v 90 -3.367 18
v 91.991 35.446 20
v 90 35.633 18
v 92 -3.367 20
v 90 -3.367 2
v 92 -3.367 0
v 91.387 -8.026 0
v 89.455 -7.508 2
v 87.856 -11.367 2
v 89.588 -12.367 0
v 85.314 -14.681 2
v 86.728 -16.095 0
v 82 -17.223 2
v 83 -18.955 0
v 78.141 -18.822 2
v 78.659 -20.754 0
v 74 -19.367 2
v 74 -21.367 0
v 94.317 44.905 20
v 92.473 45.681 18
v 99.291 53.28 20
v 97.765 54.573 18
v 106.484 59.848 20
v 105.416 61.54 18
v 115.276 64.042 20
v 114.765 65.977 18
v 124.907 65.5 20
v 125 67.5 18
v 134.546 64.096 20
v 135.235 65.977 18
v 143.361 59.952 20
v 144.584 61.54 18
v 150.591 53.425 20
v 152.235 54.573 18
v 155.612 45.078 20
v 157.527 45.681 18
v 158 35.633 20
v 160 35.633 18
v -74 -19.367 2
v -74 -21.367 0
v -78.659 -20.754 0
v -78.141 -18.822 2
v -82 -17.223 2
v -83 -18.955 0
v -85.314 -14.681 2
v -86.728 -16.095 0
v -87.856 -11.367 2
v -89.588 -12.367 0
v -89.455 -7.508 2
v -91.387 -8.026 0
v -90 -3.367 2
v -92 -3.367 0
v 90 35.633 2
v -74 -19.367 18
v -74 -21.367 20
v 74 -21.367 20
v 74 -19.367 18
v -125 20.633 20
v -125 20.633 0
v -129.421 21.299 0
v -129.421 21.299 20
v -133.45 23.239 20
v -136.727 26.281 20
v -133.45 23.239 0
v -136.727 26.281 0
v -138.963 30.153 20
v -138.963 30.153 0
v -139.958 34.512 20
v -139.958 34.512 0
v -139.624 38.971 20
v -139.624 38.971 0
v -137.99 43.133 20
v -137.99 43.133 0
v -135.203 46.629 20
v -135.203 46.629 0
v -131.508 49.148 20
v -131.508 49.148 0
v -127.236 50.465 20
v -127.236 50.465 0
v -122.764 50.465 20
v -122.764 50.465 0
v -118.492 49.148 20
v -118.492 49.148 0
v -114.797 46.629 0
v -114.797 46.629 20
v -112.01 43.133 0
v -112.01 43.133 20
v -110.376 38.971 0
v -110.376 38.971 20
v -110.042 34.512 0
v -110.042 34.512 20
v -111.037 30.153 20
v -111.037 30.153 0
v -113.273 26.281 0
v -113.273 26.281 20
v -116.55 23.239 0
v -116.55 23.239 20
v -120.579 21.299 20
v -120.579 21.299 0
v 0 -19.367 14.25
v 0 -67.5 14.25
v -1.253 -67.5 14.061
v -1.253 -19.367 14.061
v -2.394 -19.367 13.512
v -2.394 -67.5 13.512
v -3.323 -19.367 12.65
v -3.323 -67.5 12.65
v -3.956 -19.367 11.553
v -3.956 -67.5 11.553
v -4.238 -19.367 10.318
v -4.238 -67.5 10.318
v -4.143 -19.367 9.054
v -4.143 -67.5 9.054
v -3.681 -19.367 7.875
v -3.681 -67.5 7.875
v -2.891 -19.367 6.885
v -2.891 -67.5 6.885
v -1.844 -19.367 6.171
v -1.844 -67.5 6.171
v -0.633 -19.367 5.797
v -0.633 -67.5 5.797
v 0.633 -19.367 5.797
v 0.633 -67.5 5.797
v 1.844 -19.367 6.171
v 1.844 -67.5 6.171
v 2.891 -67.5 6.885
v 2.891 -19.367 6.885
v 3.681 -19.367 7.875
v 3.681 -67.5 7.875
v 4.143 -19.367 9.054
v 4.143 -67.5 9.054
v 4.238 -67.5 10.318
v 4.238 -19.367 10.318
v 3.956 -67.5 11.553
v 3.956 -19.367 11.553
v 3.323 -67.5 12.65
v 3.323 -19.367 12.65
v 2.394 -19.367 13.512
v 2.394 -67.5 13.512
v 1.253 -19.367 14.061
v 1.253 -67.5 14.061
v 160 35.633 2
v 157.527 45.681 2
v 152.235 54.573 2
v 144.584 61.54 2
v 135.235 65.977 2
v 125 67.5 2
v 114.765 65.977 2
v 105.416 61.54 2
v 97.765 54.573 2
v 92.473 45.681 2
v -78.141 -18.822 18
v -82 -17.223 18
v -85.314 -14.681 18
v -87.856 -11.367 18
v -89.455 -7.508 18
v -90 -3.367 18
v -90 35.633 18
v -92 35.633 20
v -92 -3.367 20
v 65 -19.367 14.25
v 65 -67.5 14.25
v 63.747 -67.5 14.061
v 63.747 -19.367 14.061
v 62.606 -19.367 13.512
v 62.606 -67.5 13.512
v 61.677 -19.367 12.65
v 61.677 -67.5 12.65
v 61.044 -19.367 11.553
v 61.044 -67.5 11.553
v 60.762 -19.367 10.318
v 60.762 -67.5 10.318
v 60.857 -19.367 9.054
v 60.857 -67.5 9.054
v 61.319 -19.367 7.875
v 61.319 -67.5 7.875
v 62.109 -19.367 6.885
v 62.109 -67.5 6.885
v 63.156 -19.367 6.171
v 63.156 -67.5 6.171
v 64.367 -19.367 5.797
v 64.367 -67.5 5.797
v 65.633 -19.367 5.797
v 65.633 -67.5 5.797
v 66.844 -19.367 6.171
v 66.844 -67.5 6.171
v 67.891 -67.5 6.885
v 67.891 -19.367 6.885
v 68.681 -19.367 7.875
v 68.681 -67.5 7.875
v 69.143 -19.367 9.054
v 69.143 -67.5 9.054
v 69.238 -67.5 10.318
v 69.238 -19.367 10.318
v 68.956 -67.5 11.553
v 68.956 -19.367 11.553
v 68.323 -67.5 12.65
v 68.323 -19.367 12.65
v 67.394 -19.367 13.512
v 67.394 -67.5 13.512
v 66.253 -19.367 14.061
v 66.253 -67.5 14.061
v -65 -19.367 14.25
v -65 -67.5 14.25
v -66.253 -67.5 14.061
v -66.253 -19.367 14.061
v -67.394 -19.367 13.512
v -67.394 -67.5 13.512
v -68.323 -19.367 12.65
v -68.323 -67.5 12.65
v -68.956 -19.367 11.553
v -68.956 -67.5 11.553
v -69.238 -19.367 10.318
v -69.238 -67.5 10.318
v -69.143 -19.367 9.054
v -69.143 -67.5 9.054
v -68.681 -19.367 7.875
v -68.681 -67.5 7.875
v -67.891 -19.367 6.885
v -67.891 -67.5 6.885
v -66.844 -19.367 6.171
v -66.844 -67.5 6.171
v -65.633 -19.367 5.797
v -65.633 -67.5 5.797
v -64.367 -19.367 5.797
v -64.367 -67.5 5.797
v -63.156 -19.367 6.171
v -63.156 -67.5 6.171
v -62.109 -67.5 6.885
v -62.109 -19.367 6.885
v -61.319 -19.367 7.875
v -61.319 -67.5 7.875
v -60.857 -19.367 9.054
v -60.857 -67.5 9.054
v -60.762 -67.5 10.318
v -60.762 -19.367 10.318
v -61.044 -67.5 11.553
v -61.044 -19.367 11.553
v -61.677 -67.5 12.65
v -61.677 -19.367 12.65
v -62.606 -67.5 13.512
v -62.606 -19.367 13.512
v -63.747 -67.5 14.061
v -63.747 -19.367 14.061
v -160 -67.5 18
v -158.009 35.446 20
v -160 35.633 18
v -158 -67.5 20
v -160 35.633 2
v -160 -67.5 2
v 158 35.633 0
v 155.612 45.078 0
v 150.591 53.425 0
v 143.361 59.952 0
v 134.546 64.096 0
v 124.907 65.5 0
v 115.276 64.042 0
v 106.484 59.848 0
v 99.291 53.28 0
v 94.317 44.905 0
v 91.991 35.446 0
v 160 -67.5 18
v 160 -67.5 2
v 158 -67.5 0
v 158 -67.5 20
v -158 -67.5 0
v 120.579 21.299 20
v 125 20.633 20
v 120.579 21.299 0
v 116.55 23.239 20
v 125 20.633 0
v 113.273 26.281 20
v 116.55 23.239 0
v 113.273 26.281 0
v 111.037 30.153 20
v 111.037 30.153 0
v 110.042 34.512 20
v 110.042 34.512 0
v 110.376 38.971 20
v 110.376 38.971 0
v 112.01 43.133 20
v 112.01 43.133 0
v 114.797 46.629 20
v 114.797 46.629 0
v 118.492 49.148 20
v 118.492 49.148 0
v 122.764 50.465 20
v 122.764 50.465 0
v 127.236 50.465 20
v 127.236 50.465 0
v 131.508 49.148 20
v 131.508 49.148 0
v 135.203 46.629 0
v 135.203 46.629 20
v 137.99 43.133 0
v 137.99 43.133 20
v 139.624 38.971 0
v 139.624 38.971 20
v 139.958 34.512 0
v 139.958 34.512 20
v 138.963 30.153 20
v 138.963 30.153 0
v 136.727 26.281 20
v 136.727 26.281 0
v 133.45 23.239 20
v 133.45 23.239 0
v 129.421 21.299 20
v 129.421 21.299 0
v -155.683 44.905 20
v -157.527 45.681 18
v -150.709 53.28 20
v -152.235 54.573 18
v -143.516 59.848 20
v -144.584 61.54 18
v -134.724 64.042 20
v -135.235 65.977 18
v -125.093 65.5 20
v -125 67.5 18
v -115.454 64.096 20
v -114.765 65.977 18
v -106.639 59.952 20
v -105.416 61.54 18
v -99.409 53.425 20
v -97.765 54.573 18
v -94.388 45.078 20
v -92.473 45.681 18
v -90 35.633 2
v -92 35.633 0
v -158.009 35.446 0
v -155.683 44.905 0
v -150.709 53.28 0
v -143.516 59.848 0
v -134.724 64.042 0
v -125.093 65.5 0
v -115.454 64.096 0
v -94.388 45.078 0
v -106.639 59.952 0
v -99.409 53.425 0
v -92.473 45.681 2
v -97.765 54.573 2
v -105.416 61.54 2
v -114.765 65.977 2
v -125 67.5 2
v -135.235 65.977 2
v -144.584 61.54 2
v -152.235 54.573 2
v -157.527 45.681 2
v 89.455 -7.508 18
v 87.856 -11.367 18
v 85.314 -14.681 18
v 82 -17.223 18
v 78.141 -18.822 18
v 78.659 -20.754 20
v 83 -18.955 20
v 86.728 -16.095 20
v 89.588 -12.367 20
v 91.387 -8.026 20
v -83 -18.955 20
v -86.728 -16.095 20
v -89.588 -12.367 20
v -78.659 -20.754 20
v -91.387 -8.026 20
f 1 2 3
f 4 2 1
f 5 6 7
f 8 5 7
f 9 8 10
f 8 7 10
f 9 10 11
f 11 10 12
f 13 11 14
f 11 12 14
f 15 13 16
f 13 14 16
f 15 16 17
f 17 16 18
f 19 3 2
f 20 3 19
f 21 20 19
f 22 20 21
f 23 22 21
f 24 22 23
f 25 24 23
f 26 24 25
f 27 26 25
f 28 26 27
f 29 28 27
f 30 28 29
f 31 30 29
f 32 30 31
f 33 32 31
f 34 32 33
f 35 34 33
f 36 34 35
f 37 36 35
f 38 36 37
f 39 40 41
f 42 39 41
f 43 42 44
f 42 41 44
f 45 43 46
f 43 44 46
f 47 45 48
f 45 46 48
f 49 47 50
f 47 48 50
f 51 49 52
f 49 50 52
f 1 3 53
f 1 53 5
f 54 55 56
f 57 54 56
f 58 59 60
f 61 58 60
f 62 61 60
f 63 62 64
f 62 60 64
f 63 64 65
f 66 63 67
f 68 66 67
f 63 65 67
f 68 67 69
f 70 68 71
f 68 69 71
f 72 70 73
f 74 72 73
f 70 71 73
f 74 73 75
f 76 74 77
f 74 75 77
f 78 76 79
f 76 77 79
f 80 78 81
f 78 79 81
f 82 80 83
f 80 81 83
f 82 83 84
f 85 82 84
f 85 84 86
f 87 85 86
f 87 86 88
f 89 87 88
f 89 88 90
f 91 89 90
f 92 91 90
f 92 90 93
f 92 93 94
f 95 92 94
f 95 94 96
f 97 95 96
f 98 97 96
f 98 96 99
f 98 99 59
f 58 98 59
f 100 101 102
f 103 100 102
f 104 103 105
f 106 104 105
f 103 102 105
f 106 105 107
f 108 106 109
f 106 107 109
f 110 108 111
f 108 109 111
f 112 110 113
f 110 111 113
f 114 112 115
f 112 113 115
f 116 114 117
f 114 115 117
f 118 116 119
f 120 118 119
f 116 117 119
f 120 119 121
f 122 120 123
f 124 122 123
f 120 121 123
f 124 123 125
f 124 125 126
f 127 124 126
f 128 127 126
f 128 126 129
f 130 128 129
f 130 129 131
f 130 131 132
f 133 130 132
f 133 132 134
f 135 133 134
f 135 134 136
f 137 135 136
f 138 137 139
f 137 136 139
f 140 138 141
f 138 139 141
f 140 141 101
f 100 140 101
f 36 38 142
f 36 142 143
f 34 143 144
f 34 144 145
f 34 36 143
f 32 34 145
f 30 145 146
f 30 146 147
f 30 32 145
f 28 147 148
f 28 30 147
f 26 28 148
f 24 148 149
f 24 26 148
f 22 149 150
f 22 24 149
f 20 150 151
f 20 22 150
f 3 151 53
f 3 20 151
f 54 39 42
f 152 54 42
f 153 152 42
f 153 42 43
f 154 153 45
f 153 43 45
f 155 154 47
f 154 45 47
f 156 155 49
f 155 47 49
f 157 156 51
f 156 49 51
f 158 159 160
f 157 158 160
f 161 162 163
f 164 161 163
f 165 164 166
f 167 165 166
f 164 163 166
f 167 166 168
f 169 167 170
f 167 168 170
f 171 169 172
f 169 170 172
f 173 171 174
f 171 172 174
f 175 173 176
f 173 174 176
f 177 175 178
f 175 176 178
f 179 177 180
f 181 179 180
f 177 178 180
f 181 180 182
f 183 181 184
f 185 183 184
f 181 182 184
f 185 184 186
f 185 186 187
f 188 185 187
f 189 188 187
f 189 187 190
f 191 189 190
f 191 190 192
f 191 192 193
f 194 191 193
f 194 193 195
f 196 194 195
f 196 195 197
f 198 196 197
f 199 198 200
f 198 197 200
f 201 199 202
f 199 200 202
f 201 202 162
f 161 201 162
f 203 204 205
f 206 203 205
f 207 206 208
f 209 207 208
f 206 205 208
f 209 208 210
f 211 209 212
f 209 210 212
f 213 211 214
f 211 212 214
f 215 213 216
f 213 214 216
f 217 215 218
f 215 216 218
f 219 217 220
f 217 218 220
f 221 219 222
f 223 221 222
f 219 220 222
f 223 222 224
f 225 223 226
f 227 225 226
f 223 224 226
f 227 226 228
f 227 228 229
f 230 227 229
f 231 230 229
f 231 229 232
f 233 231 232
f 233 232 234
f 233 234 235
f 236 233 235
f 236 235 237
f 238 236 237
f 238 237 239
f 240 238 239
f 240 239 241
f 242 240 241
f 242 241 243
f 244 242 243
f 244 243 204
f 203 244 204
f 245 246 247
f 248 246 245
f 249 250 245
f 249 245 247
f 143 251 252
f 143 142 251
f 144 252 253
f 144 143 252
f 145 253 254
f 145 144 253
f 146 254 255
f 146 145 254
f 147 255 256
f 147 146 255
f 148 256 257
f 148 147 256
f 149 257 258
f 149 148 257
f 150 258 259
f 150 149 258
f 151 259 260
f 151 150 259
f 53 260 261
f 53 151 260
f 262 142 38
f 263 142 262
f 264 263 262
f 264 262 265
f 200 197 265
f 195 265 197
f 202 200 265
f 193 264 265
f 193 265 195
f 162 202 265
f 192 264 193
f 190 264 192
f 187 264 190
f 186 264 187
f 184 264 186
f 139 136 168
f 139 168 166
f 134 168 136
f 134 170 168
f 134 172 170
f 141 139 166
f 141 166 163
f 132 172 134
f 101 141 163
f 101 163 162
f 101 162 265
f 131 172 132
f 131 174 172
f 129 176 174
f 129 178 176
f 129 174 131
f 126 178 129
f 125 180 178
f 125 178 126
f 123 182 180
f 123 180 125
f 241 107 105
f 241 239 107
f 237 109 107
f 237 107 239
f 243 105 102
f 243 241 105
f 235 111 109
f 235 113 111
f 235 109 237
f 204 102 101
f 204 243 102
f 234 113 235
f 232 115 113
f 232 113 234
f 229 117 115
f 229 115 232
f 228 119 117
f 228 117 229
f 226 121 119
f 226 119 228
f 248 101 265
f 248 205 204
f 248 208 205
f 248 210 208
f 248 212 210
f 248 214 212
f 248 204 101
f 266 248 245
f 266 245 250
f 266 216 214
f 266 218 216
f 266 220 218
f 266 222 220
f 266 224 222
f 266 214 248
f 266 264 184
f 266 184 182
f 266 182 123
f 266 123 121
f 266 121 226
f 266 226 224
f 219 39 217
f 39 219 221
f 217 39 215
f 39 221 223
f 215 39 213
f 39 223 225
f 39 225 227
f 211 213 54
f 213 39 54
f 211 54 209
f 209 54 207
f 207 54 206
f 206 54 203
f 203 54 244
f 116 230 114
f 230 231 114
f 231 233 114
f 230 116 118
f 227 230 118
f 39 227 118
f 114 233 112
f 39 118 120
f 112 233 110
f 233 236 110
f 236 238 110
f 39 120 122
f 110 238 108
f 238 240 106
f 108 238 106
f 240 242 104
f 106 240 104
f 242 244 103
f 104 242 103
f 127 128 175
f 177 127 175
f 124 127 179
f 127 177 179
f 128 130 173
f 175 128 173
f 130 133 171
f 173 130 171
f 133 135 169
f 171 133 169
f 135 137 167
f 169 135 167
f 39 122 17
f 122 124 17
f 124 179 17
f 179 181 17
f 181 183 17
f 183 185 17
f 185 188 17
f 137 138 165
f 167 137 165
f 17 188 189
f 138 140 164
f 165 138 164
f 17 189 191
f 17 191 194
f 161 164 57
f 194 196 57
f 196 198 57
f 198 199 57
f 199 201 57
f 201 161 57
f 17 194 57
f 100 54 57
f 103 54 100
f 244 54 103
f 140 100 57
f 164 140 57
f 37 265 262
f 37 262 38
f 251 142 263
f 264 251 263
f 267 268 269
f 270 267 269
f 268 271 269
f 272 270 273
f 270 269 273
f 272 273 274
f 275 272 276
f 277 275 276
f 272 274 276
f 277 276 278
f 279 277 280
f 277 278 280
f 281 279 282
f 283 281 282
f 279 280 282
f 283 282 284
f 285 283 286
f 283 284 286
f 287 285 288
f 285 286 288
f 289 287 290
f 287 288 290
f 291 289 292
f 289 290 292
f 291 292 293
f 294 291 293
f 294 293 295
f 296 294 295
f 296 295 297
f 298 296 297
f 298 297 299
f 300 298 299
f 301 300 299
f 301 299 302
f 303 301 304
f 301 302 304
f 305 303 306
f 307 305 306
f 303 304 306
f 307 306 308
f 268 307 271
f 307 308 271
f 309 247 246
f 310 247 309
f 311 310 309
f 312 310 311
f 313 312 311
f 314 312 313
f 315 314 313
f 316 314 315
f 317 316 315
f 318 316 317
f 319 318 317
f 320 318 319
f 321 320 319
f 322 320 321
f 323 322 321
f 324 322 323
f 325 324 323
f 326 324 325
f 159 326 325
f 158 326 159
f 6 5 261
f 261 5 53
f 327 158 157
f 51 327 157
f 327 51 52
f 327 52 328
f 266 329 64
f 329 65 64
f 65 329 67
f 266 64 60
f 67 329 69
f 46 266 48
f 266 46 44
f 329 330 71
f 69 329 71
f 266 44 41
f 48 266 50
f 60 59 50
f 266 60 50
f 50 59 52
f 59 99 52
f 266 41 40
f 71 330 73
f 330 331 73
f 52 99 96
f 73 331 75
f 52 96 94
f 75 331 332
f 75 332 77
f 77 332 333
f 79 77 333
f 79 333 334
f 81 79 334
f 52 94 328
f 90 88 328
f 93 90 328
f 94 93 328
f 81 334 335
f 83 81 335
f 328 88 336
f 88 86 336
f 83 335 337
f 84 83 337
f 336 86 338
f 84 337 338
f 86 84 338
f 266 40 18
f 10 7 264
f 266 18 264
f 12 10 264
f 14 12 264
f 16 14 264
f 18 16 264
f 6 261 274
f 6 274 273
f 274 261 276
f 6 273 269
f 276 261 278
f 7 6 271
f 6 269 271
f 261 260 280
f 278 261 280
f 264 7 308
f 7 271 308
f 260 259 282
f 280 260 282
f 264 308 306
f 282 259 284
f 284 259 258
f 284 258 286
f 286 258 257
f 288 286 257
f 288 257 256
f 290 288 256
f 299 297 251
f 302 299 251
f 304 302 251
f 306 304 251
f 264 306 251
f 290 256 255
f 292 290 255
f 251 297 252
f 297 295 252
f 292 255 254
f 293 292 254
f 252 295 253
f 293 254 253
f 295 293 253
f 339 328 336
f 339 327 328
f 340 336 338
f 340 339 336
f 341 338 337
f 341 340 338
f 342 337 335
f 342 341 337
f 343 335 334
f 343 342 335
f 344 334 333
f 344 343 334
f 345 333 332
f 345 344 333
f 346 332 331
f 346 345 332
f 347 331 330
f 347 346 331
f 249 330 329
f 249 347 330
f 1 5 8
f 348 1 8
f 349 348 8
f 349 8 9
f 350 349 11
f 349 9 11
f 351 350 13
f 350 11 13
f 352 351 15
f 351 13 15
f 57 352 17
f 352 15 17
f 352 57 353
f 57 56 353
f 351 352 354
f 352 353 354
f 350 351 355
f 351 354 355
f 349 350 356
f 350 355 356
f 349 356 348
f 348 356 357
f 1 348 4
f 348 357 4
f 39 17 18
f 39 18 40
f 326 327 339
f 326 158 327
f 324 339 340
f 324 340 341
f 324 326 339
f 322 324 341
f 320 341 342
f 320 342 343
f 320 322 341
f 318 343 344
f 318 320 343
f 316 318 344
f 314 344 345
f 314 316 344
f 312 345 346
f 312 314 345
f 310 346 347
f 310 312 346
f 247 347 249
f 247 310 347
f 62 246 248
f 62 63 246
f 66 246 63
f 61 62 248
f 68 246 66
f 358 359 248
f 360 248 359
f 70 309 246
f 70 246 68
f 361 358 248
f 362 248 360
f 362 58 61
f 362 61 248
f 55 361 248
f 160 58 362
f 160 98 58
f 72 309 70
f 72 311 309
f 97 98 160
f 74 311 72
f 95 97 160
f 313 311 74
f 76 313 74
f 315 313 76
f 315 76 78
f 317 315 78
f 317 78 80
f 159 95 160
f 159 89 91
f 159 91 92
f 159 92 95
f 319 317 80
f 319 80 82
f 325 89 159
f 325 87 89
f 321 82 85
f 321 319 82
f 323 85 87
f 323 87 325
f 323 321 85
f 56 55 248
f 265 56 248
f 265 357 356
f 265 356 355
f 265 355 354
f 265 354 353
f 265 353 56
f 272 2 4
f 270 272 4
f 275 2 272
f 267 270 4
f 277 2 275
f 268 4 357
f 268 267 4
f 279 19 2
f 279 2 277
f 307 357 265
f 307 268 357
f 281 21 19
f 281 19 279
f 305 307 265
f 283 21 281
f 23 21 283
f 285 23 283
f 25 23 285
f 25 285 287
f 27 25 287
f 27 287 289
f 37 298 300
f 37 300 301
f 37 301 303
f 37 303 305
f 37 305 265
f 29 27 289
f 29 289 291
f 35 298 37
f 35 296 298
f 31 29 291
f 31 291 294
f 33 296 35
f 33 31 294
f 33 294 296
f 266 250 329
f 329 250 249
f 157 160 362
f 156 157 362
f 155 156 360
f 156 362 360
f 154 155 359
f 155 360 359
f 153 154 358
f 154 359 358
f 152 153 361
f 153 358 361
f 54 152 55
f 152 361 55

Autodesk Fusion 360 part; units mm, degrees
sketch "Sketch1" plane through (0, 0, 0) normal (0, 0, 1) x (1, 0, 0)
  line L0 (160, -67.5) -> (-160, -67.5)
  line L1 (-160, -67.5) -> (-160, 67.5)
  line L2 (-160, 67.5) -> (160, 67.5)
  line L3 (160, 67.5) -> (160, -67.5)
  line L4 (160, -67.5) -> (-160, 67.5) construction
  line L5 (-160, -67.5) -> (160, 67.5) construction
  line L6 (-160, 67.5) -> (-125, 67.5)
  line L7 (-125, 67.5) -> (-125, 42.5)
  line L8 (-125, 42.5) -> (-160, 42.5)
  line L9 (-160, 42.5) -> (-160, 67.5)
  line L10 (125, 42.5) -> (160, 42.5)
  line L11 (160, 42.5) -> (160, 67.5)
  line L12 (160, 67.5) -> (125, 67.5)
  line L13 (125, 67.5) -> (125, 42.5)
  dimension "d1" = 320
  dimension "d2" = 135
  dimension "d3" = 35
  dimension "d4" = 35
  dimension "d5" = 25
  dimension "d6" = 25
extrude "Extrude1" add sketch "Sketch1" along normal blind 20
sketch "Sketch2" plane through (0, 0, 20) normal (0, 0, 1) x (1, 0, 0)
  line L0 (160, -67.5) -> (160, 67.5)
  line L1 (160, 67.5) -> (-160, 67.5)
  line L2 (-160, 67.5) -> (-160, -67.5)
  line L3 (-160, -67.5) -> (160, -67.5)
  line L4 (-125, 35.633) -> (125, 35.633)
  dimension "d9" = 250
  dimension "d11" = 103.133
hole "Hole1" at (-125, 35.633, 20) at (125, 35.633, 20) direction (0, 0, -1) diameter 30 depth 50 tip angle 118
sketch "Sketch3" plane through (0, 0, 20) normal (0, 0, 1) x (1, 0, 0)
  circle A0 centre (-125, 35.633) radius 15
  circle A1 centre (125, 35.633) radius 15
  line L0 (160, -67.5) -> (160, 67.5)
  line L1 (160, 67.5) -> (-160, 67.5)
  line L2 (-160, 67.5) -> (-160, -67.5)
  line L3 (-160, -67.5) -> (160, -67.5)
  line L4 (-125, 35.633) -> (-160, 35.633)
  line L5 (125, 35.633) -> (126.752, 35.633)
  line L6 (126.752, 35.633) -> (160, 35.633)
  line L7 (125, 35.633) -> (90, 35.633)
  line L8 (-125, 35.633) -> (-90, 35.633)
  line L9 (-90, 35.633) -> (-90, -19.367)
  line L10 (90, 35.633) -> (90, -19.367)
  line L11 (-90, -19.367) -> (90, -19.367)
  line L12 (-125, 35.633) -> (-125, 67.5)
  line L13 (125, 35.633) -> (125, 67.5)
  arc A2 (-90, 35.633) -> (-160, 35.633) centre (-125, 32.346) ccw
  arc A3 (160, 35.633) -> (90, 35.633) centre (125, 32.346) ccw
  dimension "d15" = 55
  dimension "d16" = 70
  dimension "d17" = 55
extrude "Extrude2" cut sketch "Sketch3" against normal blind 20 contours L1 L9 L10 L11 A2 A3 | L1 L2 A2 | L0 L1 A3
sketch "Sketch4" plane through (0, -19.367, 0) normal (0, 1, 0) x (-1, 0, 0)
  line L0 (90, 20) -> (-90, 20)
  line L1 (-90, 20) -> (-90, 0)
  line L2 (-90, 0) -> (90, 0)
  line L3 (90, 0) -> (90, 20)
  line L4 (90, 10) -> (65, 10)
  line L5 (-90, 10) -> (-65, 10)
  line L6 (0, 10) -> (-25, 10)
  dimension "d20" = 25
  dimension "d21" = 25
  dimension "d22" = 10
  dimension "d23" = 10
  dimension "d24" = 25
  dimension "d25" = 10
hole "Hole2" at (-65, -19.367, 10) at (0, -19.367, 10) at (65, -19.367, 10) direction (0, -1, 0) diameter 8.5 end through all
fillet "Fillet1" radius 16 2 edges at (-90, -19.367, 10) (90, -19.367, 10)
chamfer "Chamfer1" distance 2 angle 45 18 edges at (-125, 67.5, 20) (-90, 16.133, 20) (90, 16.133, 20) (85.3137, -14.6807, 20) (0, -19.367, 20) (-85.3137, -14.6807, 20) (125, 67.5, 20) (160, -15.9335, 20) (-160, -15.9335, 20) (160, -15.9335, 0) (125, 67.5, 0) (90, 16.133, 0) (-90, 16.133, 0) (-85.3137, -14.6807, 0) (0, -19.367, 0) (85.3137, -14.6807, 0) (-125, 67.5, 0) (-160, -15.9335, 0)
equation "d2 = 160 mm - 25 mm"
equation "d9 = 320 mm - 35 mm - 35 mm"
equation "d11 = 88.133 mm + 15 mm"
